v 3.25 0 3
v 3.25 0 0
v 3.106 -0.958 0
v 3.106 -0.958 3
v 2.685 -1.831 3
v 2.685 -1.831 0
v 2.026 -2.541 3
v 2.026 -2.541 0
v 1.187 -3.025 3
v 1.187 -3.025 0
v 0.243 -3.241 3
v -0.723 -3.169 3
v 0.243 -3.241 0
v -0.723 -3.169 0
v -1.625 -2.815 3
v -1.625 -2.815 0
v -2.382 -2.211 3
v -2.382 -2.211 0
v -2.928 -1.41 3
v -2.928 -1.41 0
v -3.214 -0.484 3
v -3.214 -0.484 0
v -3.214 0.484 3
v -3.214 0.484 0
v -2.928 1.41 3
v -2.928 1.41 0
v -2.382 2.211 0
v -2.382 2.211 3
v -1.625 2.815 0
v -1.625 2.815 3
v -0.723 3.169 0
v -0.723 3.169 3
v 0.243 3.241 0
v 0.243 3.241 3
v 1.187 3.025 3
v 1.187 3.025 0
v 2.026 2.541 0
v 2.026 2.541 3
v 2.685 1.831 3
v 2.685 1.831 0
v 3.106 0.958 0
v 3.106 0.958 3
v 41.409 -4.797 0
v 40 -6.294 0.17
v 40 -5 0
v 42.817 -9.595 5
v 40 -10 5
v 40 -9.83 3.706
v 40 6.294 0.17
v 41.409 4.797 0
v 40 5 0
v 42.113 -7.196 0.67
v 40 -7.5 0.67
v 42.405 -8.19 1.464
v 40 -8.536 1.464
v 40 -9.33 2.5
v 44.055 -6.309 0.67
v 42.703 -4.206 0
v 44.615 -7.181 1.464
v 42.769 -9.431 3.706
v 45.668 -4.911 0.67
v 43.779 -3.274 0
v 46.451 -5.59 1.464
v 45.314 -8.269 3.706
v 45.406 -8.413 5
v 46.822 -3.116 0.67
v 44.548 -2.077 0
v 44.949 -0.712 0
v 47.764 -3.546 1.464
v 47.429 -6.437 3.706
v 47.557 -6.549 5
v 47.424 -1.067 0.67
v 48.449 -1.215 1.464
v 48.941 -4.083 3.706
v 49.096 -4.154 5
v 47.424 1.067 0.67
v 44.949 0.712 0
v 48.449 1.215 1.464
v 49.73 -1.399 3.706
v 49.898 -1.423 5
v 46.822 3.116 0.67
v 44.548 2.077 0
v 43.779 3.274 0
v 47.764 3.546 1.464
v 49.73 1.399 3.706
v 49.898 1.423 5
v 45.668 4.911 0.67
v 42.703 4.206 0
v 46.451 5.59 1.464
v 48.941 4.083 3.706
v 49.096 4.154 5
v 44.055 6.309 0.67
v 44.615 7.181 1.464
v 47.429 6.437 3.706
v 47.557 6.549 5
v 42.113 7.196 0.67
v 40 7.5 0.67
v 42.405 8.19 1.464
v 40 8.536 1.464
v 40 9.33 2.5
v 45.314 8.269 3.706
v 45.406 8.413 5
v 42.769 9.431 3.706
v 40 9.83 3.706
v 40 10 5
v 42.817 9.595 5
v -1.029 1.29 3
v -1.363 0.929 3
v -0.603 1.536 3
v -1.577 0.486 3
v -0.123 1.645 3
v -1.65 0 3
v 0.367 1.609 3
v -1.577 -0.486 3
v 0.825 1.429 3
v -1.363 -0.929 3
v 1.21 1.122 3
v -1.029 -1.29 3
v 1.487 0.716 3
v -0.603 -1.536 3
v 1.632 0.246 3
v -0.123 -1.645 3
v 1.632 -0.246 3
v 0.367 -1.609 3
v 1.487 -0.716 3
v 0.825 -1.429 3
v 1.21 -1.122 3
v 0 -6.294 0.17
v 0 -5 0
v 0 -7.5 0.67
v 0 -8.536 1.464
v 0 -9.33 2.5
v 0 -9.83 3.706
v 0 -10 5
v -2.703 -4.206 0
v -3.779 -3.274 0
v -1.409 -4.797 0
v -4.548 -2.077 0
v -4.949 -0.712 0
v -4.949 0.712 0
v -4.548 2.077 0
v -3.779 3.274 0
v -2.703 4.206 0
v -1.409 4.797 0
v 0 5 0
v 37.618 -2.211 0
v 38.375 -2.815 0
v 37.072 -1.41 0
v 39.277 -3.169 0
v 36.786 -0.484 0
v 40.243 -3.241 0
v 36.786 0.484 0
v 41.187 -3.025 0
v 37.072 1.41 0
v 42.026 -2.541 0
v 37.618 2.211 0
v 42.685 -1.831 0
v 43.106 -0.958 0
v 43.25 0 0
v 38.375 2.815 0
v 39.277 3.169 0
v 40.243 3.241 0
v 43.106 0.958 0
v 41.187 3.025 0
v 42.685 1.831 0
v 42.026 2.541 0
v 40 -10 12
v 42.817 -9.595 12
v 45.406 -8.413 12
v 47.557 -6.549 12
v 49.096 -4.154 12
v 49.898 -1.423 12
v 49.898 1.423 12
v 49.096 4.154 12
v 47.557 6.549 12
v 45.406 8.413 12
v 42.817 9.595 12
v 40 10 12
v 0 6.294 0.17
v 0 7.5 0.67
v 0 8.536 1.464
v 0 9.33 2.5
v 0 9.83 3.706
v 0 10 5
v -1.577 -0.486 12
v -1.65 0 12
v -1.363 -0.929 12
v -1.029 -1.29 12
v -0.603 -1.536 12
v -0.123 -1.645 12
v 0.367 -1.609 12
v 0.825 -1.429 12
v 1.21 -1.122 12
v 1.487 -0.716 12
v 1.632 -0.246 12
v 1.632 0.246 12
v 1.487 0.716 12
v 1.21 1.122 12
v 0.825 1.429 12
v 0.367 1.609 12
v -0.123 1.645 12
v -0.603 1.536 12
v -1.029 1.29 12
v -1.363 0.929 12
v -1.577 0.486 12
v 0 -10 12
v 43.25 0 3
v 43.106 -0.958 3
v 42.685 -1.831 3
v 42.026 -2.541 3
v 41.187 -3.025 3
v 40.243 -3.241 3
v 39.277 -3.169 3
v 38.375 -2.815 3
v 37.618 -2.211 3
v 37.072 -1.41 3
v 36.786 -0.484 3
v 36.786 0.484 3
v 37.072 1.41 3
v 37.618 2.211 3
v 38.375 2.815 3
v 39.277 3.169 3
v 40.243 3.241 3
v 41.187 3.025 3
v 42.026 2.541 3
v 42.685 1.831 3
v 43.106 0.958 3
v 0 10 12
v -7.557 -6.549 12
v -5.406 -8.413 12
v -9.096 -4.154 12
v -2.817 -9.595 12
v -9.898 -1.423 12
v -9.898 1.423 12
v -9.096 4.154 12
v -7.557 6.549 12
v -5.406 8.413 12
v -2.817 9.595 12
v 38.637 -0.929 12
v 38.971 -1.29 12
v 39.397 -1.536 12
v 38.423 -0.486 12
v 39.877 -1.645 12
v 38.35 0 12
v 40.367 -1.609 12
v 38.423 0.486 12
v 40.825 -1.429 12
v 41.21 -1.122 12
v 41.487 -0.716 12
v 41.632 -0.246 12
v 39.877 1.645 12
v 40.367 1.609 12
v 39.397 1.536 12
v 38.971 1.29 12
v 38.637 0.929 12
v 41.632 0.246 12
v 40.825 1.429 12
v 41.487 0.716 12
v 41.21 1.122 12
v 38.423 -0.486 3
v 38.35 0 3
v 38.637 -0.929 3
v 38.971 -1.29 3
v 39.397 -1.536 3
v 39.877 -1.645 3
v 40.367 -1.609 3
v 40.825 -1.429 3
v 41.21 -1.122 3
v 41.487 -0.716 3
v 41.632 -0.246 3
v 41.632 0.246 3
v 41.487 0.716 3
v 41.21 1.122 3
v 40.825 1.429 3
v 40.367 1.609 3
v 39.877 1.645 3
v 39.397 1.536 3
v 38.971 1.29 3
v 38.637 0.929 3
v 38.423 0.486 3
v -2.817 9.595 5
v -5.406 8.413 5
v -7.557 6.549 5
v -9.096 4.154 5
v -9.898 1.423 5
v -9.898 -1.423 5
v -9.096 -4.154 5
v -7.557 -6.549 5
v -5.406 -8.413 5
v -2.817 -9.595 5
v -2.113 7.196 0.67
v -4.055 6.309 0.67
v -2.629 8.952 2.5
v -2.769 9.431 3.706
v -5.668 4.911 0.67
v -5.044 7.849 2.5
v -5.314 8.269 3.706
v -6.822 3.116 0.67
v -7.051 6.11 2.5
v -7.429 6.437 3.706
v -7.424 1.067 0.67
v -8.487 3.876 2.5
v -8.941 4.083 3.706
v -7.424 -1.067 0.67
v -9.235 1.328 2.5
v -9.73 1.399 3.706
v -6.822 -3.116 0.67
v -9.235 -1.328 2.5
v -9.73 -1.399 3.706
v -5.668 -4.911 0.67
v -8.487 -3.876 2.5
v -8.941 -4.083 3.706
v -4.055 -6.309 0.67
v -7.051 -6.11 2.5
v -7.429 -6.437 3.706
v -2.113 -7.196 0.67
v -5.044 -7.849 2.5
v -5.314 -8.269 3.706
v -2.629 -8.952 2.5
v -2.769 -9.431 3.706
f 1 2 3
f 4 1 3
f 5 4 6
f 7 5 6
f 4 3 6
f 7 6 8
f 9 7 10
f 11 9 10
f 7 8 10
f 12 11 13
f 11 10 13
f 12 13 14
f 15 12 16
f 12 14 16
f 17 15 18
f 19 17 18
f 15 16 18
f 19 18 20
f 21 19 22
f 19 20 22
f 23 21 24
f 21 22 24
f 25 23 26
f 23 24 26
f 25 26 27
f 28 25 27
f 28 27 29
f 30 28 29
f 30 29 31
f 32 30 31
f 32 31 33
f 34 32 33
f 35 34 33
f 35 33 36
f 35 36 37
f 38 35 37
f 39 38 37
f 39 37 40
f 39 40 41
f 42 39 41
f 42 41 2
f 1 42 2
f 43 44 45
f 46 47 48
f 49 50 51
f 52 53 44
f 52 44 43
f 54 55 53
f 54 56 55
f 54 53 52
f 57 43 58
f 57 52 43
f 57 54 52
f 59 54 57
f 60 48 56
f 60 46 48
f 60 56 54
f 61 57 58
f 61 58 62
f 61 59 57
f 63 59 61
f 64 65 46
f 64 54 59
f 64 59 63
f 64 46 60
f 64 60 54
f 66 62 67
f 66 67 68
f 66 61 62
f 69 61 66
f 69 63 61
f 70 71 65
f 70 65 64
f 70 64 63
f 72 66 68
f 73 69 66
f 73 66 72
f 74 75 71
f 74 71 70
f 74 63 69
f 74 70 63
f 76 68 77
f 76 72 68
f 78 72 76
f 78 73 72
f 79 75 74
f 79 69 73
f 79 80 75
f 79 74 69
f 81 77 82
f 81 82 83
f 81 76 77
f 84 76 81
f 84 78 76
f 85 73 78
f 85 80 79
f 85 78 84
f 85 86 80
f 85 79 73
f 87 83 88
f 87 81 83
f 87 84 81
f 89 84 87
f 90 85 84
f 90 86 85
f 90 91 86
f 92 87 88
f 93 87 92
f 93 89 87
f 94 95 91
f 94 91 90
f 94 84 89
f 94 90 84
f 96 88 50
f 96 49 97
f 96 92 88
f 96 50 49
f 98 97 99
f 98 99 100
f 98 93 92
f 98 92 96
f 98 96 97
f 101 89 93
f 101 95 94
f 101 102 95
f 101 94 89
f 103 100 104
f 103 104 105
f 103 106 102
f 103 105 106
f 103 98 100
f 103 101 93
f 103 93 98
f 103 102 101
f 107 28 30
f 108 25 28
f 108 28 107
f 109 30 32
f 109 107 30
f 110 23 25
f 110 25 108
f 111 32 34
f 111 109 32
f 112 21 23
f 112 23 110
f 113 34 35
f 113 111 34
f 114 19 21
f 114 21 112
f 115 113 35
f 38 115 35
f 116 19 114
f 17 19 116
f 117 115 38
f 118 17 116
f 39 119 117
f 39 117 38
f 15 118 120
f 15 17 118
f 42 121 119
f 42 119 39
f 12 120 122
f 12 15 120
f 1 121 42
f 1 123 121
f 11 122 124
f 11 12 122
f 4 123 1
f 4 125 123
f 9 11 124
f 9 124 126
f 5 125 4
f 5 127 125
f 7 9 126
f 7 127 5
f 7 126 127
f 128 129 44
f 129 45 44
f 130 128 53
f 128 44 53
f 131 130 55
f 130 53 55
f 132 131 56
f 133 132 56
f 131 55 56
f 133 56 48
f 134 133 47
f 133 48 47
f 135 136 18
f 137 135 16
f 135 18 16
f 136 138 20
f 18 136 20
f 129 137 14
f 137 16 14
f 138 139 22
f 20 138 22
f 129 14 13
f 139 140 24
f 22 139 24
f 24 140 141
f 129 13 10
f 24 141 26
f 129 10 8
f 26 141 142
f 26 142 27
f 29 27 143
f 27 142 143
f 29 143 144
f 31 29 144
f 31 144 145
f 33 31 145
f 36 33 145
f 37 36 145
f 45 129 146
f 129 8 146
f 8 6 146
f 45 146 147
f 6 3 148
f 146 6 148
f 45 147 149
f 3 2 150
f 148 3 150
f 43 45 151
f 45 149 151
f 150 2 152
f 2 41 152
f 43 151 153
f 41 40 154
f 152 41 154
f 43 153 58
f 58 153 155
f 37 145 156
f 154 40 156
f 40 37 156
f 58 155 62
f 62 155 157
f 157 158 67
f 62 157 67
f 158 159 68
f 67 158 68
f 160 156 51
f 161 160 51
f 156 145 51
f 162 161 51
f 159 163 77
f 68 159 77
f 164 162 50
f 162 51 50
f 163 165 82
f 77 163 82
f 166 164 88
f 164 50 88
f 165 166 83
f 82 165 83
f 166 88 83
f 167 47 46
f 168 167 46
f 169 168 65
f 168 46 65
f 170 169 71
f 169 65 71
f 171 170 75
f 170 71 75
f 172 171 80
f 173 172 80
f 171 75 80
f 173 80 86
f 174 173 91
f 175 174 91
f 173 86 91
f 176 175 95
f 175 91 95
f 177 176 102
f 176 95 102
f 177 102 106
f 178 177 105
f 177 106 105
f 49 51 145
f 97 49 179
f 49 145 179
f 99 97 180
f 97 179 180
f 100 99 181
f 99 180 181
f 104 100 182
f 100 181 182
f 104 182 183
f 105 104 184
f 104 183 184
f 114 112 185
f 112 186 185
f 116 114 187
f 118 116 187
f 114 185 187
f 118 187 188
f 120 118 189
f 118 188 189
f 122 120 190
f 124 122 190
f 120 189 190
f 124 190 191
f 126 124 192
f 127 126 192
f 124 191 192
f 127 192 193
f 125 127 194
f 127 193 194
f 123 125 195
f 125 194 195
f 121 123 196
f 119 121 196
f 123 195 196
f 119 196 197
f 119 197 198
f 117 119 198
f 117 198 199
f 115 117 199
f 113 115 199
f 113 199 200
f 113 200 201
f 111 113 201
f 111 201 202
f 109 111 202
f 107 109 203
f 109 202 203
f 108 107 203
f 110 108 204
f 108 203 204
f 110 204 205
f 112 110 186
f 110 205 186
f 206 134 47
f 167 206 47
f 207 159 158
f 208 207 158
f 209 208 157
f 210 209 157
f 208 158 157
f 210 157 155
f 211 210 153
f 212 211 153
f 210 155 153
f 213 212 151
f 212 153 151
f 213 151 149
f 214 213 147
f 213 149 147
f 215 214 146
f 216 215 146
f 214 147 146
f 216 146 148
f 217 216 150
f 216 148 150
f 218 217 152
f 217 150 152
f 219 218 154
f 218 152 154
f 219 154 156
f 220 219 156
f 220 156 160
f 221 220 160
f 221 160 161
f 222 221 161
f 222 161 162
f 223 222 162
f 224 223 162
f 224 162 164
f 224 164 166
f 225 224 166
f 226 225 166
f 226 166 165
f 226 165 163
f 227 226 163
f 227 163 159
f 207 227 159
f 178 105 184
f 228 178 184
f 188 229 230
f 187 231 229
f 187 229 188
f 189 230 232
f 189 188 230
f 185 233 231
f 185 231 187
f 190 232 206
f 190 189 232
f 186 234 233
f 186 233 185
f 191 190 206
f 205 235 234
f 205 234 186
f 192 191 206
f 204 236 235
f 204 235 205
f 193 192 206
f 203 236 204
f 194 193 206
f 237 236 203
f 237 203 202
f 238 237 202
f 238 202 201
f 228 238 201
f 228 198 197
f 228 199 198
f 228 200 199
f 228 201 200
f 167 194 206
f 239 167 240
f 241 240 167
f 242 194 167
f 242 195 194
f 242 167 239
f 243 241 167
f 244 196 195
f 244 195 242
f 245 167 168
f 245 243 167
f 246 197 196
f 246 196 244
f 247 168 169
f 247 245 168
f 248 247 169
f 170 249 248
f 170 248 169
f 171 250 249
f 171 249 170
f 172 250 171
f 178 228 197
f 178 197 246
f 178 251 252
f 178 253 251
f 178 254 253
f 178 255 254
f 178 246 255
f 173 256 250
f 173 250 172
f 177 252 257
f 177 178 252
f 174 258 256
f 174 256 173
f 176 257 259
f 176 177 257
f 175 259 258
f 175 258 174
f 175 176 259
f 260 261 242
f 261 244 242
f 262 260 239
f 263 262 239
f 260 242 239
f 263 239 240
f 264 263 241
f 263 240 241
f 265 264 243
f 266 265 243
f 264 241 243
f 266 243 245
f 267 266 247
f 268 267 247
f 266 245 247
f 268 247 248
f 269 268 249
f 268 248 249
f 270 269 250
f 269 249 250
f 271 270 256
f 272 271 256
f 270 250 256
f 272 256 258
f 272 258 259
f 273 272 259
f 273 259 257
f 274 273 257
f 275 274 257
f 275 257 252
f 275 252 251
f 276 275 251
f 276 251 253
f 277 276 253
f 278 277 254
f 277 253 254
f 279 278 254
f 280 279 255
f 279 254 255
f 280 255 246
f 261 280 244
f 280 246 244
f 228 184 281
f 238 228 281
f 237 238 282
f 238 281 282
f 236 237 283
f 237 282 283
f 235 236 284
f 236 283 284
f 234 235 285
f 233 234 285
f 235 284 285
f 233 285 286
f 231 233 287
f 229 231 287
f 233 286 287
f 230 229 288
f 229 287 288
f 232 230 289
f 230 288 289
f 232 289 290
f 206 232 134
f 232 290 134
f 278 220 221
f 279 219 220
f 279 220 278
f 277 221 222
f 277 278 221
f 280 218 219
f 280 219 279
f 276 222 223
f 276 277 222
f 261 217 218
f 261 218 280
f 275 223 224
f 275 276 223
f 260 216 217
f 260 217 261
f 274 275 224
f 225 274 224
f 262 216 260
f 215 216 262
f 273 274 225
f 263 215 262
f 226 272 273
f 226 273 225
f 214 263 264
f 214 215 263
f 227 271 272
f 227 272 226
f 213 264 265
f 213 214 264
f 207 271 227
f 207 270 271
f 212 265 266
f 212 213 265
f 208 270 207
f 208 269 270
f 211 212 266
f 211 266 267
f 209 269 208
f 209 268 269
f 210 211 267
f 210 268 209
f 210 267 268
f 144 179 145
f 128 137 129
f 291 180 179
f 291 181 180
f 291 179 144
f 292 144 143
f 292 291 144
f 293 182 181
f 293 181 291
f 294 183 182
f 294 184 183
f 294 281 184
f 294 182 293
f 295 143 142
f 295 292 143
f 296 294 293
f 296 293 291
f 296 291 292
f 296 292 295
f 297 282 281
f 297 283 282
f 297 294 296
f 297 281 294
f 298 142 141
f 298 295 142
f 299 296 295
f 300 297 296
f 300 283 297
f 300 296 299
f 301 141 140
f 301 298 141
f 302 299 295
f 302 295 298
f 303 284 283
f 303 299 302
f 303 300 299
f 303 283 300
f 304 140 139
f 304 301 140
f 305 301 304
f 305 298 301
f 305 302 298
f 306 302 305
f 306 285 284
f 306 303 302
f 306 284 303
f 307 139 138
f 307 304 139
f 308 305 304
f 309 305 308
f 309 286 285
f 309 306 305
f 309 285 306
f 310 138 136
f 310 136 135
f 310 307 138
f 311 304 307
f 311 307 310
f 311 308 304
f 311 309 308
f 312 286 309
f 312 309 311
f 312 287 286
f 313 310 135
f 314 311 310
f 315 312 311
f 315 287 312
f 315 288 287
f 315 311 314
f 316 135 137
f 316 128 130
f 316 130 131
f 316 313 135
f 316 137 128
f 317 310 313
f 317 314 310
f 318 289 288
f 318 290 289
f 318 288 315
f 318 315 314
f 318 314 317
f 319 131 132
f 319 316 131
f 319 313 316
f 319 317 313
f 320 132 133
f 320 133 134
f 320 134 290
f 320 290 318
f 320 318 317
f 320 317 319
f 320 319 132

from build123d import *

# Parameters (mm, degrees)
F1_DEPTH       = 12
F2_D           = 3.3
F2_CBORE_D     = 6.5
F2_CBORE_DEPTH = 3
F3_R           = 5


with BuildPart() as f1:
    # F0 (on Top) → F1 (new body)
    with BuildSketch(Plane.XY):
        with BuildLine():
            Line((40, 10), (0, 10))
            ThreePointArc((0, 10), (-10, 0), (0, -10))
            Line((0, -10), (40, -10))
            ThreePointArc((40, -10), (50, 0), (40, 10))
        make_face()
    extrude(amount=F1_DEPTH)

    # F2 (through all)
    with Locations(Plane(origin=(0, 0, 0), x_dir=(1, 0, 0), z_dir=(0, 0, -1))):
        with Locations((40, 0), (0, 0)):
            CounterBoreHole(F2_D / 2, F2_CBORE_D / 2, F2_CBORE_DEPTH)

    # F3
    f3_edges = [f1.edges().sort_by_distance(p)[0] for p in [
        (20, -10, 0),
    ]]
    fillet(f3_edges, radius=F3_R)


solid = f1.part
